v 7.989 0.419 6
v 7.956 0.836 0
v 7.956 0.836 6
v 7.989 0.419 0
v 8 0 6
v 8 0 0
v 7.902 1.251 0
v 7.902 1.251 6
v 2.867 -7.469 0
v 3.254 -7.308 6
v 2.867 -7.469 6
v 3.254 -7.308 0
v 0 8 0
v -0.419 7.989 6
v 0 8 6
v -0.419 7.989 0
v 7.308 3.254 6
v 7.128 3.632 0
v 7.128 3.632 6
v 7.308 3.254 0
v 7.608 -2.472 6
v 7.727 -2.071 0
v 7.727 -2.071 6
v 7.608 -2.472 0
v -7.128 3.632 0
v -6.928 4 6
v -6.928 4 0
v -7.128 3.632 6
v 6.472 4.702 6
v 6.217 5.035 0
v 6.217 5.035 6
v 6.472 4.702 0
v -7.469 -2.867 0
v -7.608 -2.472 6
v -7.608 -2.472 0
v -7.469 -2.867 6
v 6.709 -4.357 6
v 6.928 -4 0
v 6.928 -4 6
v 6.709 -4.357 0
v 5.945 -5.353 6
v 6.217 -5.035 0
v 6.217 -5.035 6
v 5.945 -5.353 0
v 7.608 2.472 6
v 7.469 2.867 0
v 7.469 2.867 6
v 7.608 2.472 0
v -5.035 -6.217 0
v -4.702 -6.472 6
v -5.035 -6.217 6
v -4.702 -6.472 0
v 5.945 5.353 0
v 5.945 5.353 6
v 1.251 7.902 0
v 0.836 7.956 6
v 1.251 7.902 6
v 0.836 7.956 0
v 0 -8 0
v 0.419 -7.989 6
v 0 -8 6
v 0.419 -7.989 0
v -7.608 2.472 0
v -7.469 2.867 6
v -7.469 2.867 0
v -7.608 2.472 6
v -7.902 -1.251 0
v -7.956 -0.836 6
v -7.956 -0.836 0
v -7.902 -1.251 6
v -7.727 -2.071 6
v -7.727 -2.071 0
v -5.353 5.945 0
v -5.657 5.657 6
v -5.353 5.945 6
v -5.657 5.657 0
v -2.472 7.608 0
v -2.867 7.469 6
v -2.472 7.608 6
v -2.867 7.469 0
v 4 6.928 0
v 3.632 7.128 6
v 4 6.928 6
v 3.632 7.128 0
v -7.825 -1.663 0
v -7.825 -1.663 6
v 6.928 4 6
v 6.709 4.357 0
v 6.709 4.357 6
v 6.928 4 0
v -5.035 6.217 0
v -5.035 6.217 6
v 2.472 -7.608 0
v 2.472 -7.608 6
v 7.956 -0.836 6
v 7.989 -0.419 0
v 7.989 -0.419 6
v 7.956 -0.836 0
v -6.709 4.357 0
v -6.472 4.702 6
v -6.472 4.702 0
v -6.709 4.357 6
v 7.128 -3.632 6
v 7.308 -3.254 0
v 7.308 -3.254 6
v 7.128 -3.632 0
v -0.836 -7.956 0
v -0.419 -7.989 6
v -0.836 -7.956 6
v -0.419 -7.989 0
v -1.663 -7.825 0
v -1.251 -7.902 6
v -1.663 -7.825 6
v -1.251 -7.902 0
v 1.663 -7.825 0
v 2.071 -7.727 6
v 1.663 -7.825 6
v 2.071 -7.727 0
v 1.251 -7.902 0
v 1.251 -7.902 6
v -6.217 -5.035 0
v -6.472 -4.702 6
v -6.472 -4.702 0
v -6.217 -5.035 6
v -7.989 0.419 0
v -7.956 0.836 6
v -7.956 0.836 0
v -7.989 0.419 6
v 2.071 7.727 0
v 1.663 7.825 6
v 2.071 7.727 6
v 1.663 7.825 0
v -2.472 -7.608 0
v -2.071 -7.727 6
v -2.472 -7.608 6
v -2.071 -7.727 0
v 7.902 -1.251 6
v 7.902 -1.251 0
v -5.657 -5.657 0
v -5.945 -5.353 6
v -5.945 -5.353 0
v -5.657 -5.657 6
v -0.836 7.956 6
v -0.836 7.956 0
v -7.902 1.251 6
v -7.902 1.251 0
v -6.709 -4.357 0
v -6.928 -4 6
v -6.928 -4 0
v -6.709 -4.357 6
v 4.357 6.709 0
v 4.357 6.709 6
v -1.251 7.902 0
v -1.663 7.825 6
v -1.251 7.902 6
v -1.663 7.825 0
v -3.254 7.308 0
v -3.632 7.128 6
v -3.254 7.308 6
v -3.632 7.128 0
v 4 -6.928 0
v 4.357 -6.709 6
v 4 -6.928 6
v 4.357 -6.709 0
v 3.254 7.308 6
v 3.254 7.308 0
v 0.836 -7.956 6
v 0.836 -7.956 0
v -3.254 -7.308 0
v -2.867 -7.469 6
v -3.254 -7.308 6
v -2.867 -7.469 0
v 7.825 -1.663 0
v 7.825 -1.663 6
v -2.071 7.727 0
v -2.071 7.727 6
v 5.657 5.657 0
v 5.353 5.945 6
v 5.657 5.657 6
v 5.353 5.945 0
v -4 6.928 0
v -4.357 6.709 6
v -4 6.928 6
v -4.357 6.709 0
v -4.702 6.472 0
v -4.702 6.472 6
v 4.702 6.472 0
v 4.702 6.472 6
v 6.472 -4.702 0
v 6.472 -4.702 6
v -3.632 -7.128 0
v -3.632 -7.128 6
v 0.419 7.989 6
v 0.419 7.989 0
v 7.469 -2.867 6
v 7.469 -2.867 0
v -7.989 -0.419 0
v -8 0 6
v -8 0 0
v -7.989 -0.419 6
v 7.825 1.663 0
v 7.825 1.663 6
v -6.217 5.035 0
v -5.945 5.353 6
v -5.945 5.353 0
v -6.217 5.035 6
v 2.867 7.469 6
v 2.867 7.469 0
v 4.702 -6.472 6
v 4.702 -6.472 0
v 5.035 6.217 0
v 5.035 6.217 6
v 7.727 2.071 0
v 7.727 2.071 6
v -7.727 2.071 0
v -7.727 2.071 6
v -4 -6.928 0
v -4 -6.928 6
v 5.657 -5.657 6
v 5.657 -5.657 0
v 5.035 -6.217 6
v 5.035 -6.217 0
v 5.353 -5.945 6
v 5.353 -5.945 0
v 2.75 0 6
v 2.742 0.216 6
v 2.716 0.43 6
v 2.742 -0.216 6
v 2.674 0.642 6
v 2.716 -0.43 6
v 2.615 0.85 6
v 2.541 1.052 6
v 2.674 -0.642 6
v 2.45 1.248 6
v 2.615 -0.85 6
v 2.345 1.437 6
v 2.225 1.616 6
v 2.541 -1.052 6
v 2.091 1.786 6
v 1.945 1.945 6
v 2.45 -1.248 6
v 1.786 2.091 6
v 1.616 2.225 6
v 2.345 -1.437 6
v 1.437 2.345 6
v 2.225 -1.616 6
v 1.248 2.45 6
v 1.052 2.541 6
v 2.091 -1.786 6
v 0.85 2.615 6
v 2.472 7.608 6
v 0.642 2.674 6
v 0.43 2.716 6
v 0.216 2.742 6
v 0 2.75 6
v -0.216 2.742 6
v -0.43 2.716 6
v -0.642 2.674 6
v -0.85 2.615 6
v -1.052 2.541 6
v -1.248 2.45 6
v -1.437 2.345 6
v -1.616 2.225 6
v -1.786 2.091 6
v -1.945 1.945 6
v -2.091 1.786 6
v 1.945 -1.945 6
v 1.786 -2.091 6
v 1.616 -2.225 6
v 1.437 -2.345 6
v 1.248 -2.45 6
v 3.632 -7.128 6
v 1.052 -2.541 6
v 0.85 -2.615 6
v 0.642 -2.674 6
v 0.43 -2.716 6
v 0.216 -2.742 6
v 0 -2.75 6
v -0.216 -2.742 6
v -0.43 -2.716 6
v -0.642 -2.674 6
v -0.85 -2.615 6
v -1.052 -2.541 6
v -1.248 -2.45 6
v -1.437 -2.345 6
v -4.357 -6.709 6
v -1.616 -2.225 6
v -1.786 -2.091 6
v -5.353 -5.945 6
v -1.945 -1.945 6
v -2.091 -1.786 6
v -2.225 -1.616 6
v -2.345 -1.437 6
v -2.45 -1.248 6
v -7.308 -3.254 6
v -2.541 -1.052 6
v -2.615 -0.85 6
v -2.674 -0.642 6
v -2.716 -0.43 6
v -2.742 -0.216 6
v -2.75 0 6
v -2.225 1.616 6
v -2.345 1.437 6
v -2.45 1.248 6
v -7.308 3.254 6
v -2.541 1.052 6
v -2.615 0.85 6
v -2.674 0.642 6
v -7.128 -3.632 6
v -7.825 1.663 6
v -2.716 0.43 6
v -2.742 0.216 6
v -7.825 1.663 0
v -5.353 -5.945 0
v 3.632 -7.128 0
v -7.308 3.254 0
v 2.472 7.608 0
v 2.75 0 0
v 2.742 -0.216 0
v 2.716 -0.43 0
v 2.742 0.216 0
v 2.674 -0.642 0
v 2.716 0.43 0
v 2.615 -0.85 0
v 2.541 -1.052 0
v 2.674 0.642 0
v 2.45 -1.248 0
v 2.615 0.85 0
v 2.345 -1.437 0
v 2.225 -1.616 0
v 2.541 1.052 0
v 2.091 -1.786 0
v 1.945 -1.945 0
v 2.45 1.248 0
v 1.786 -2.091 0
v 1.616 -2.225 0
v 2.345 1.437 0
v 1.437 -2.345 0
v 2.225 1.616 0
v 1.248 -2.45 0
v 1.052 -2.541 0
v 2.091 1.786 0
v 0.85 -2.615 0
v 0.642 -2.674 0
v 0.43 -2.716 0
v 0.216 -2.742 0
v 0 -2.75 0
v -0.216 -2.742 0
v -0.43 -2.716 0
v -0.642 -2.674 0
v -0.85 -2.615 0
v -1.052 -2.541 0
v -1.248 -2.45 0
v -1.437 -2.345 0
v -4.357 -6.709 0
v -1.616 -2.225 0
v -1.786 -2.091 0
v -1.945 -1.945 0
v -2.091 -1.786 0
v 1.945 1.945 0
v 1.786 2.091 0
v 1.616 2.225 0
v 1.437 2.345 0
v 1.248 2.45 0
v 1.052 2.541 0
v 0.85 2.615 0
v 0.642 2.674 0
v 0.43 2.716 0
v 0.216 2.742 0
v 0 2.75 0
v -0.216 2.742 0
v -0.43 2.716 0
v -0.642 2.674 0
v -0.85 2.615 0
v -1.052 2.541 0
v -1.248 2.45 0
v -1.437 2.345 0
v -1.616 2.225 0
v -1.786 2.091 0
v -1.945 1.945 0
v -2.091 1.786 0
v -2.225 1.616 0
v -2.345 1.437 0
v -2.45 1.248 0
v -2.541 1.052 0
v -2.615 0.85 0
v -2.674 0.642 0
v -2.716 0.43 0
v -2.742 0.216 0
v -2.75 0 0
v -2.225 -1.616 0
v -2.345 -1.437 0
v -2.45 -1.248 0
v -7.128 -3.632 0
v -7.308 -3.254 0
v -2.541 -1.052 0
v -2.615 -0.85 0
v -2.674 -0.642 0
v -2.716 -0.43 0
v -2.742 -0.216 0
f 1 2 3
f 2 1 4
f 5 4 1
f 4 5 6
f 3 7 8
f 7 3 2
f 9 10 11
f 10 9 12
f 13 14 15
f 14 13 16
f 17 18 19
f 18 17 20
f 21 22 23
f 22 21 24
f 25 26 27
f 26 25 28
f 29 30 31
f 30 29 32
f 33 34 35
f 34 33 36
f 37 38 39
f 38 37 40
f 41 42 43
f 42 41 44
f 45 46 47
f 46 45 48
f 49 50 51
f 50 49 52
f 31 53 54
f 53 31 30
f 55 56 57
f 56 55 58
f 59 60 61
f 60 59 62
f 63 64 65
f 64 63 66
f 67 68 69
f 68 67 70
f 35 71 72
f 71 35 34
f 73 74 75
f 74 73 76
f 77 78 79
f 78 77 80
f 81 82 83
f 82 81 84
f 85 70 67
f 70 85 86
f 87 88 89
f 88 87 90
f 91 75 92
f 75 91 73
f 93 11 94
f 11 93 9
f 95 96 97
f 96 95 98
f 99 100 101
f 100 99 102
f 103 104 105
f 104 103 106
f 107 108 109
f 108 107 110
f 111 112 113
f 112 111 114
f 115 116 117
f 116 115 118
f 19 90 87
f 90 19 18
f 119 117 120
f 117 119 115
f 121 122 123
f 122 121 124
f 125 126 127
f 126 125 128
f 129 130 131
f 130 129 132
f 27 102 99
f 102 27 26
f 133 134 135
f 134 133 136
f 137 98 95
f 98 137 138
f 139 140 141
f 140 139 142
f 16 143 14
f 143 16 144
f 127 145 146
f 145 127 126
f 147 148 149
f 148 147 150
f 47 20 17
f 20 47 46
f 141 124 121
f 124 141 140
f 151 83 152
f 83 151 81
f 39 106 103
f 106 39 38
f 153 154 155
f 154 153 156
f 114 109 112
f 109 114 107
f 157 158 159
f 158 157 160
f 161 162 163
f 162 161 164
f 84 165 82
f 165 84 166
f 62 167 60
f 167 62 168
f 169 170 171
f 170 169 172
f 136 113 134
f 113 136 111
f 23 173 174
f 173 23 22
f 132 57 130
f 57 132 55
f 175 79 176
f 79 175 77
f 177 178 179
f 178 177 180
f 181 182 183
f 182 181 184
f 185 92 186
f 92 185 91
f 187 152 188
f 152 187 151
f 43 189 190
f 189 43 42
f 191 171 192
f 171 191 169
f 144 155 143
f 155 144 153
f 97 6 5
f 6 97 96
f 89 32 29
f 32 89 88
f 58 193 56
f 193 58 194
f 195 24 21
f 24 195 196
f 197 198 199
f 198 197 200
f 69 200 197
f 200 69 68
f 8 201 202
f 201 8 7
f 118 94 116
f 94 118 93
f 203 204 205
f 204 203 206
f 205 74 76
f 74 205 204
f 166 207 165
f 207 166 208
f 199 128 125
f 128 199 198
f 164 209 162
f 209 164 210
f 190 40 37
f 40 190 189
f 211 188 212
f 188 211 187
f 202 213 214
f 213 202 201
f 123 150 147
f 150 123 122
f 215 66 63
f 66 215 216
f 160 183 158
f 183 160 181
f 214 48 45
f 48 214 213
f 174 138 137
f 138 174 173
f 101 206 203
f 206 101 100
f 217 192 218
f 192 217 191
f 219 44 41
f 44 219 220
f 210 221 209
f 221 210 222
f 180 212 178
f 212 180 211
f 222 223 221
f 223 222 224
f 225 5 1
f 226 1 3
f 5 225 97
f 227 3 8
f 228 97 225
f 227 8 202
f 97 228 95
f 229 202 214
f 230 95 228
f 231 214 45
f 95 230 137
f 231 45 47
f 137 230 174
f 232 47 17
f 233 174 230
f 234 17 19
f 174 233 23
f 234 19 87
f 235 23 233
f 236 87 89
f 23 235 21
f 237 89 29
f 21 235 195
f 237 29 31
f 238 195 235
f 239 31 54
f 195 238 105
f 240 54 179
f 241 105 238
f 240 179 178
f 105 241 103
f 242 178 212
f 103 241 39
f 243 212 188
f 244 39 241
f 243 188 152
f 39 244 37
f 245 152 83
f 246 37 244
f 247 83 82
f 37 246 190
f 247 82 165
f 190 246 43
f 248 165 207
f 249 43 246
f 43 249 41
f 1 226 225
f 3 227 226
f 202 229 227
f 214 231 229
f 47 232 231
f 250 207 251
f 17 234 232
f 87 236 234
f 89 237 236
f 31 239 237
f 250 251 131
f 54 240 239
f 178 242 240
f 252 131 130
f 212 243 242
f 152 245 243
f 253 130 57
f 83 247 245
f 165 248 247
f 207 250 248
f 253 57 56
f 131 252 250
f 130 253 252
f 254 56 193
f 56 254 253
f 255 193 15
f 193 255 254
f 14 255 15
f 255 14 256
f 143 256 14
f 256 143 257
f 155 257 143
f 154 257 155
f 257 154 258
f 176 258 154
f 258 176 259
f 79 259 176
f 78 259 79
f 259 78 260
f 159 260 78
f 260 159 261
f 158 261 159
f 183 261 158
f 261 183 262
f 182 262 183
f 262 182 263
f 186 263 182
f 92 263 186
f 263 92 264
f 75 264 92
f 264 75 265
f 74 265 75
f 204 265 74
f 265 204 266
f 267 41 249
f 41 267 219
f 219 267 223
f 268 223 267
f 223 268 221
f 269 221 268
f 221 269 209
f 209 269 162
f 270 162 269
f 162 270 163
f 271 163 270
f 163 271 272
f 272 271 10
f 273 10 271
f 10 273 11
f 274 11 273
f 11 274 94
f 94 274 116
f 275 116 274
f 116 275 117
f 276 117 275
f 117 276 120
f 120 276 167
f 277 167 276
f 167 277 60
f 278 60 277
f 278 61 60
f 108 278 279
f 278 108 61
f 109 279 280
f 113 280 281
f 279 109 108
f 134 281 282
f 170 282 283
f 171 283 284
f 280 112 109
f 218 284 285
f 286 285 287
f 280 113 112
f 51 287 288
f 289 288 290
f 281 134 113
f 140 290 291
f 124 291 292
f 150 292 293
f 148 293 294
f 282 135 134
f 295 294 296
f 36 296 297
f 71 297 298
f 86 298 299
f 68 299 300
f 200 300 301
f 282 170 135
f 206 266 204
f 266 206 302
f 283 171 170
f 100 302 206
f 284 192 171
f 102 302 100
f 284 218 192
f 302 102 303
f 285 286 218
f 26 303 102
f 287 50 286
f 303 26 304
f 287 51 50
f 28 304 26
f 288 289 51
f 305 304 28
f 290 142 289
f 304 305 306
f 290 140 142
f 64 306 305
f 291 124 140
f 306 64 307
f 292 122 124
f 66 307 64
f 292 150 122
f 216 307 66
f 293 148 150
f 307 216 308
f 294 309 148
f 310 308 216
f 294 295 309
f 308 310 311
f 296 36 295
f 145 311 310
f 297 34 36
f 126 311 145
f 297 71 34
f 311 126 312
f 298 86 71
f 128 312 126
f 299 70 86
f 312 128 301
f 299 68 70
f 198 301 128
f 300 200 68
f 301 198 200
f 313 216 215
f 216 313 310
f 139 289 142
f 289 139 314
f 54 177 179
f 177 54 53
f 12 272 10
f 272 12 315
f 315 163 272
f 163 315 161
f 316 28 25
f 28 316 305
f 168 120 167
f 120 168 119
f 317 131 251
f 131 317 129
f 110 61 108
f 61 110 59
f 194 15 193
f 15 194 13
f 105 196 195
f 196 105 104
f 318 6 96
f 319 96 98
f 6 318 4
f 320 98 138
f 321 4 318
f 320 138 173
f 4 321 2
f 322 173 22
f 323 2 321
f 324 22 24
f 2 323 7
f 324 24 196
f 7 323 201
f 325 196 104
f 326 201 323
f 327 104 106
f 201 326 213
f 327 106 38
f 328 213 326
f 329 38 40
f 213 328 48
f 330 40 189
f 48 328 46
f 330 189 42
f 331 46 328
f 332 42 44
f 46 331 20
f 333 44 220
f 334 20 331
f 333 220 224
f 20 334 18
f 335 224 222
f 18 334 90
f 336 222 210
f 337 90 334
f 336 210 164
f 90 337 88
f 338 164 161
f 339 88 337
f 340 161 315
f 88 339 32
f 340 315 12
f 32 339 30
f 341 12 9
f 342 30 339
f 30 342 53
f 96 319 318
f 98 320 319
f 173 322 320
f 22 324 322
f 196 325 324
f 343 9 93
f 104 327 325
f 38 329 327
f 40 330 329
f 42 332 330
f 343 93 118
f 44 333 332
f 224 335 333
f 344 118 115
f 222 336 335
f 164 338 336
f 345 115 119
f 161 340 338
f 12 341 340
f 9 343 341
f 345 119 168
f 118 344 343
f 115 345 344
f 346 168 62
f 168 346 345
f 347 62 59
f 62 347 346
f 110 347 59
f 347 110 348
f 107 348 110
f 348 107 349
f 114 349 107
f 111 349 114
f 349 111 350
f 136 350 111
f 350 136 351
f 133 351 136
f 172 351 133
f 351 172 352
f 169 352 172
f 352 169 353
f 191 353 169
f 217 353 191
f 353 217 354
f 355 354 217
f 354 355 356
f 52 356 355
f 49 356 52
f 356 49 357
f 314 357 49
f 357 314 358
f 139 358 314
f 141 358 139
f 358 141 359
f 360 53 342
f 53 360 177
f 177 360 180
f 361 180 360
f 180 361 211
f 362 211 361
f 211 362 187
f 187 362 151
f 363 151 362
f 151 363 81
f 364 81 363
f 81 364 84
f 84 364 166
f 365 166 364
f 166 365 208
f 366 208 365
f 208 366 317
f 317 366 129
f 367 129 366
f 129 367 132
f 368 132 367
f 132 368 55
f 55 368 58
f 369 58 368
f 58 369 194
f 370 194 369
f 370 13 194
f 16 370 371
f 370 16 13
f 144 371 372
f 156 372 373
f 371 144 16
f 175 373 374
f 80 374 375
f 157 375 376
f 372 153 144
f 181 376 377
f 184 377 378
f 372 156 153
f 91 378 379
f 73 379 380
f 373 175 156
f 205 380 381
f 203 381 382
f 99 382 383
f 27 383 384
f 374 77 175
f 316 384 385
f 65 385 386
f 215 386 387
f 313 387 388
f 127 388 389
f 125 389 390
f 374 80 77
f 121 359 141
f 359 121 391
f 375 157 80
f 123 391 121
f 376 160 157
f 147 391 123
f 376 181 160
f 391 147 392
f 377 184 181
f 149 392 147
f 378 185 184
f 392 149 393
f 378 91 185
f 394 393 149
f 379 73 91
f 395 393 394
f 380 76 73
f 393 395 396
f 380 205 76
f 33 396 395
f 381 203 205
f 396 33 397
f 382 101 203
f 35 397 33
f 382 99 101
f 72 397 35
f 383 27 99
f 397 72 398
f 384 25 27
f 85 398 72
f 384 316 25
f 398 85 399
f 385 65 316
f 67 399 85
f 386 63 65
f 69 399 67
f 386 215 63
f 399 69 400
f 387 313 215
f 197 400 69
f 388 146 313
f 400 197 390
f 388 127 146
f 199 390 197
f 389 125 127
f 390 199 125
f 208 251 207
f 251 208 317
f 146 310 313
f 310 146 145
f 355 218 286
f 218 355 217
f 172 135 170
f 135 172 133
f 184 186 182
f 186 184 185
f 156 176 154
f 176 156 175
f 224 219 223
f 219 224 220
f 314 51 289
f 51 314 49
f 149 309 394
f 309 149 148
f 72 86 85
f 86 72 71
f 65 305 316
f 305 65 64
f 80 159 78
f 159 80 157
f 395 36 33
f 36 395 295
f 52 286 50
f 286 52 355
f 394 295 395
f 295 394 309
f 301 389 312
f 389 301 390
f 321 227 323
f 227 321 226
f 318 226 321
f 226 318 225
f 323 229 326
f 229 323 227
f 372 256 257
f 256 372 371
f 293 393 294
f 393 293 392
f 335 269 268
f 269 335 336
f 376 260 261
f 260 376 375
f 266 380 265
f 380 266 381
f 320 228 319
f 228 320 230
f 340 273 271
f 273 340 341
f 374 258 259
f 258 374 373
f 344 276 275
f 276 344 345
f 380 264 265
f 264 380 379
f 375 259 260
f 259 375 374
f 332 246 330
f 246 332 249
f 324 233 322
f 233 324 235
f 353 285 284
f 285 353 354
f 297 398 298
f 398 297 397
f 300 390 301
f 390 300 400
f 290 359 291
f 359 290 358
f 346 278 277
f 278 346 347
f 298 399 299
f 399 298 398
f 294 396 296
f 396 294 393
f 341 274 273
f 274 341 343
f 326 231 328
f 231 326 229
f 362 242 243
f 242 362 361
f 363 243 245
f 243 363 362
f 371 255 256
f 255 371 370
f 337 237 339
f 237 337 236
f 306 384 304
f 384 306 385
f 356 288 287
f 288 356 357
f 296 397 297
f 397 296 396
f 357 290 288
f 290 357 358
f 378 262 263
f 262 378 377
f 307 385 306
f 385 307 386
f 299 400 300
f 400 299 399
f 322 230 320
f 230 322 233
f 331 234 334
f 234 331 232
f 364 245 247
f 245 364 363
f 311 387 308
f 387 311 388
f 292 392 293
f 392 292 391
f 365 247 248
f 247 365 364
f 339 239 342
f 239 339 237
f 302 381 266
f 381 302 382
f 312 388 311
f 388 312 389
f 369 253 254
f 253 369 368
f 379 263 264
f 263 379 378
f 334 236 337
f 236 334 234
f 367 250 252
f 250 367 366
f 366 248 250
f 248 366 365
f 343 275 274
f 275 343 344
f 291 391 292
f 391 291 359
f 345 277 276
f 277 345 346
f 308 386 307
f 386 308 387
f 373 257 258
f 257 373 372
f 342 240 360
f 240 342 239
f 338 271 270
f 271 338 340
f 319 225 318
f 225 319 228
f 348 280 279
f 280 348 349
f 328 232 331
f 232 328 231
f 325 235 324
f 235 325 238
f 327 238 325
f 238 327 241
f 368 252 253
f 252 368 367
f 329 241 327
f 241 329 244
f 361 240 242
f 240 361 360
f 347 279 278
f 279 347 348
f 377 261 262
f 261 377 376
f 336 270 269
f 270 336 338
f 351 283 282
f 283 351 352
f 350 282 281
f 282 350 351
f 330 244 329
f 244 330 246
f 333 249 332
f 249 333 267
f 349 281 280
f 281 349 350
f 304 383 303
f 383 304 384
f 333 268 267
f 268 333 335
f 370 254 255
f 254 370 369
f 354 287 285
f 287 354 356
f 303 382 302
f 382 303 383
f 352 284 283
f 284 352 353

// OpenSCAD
// file: src/debug_functions.scad
// ============================================================
// debug_functions.scad  (visual debugging helpers)
// ============================================================

// pct (0..100) -> t (0..path_portion)
function pct_to_t(pct, path_portion=1.0) = (pct/100) * path_portion;

function path_point_at_pct(
    pct, hub_d, hub_height, blade_length, blade_offset,
    leadW_pct, trailW_pct, leadX_pct, trailX_pct,
    path_portion=1.0
) =
    toroidal_path_spline_3d(
        pct_to_t(pct, path_portion),
        hub_d, hub_height, blade_length, blade_offset,
        leadW_pct, trailW_pct, leadX_pct, trailX_pct
    );

// ============================================================
// Debug: draw a 3D polyline (tube segments)
// ============================================================
module path_polyline(points, steps, r=0.35){
    for (i = [0:steps-1]) {
        p0 = points[i];
        p1 = points[i+1];
        v  = p1 - p0;
        L  = norm(v);

        if (L > 1e-9) {
            translate(p0)
                rotate(a = acos(clamp(v[2]/L, -1, 1)), v = [-v[1], v[0], 0])
                    cylinder(h=L, r=r, $fn=24);
        }
    }
}

module path_points_debug(points, r=0.6){
    for (p = points) translate(p) sphere(r=r, $fn=24);
}


// ============================================================
// 2D polyline -> tube (cylinders)
// ============================================================
module polyline2d_tube(pts2d, steps2d, r=0.12){
    for(i=[0:steps2d-2]){
        p0 = pts2d[i];
        p1 = pts2d[i+1];
        v  = [p1[0]-p0[0], p1[1]-p0[1], 0];
        L  = norm(v);

        if (L > 1e-9){
            translate([p0[0], p0[1], 0])
                rotate(a = acos(clamp(v[0]/L, -1, 1)), v=[0,0,1])
                    cylinder(h=L, r=r, $fn=16);
        }
    }
}

module polyline2d_tube_closed(pts2d, steps2d, r=0.12){
    polyline2d_tube(pts2d, steps2d, r=r);

    p0 = pts2d[steps2d-1];
    p1 = pts2d[0];
    v  = [p1[0]-p0[0], p1[1]-p0[1], 0];
    L  = norm(v);

    if (L > 1e-9){
        translate([p0[0], p0[1], 0])
            rotate(a = acos(clamp(v[0]/L, -1, 1)), v=[0,0,1])
                cylinder(h=L, r=r, $fn=16);
    }
}


// ============================================================
// Draw a profile outline as a "line" (tube) with chord/pivot/attack
// ============================================================
module draw_profile2D_as_line(profile, chord=10, chord_pivot_pct=0, attack_angle=0, n=90, r=0.12){
    px  = chord_pivot_pct/100;
    pts = profile_points(profile, n=n);

    // pivot + chord scale
    pts2 = [ for(p=pts) [ (p[0]-px)*chord, p[1]*chord ] ];

    // rotate in 2D (attack)
    ca = cos(attack_angle);
    sa = sin(attack_angle);
    pts3 = [ for(p=pts2) [ p[0]*ca - p[1]*sa, p[0]*sa + p[1]*ca ] ];

    steps2d = list_size(pts3);
    polyline2d_tube_closed(pts3, steps2d, r=r);
}


// ============================================================
// Debug: draw profiles along the path (perpendicular to the path)
// ============================================================
module draw_profiles_on_path_perp(
    profiles, profile_pcts, chords, chord_pivot_pcts, attack_angles,
    hub_d, hub_height, blade_length, blade_offset,
    leadW_pct, trailW_pct, leadX_pct, trailX_pct,
    path_portion=1.0,
    n=90, r=0.12
){
    n_profiles = list_size(profiles);

    for (i=[0:n_profiles-1]) {
        t = (profile_pcts[i]/100) * path_portion;

        P = toroidal_path_spline_3d(
            t, hub_d, hub_height, blade_length, blade_offset,
            leadW_pct, trailW_pct, leadX_pct, trailX_pct
        );

        T = path_tangent_at_t(
            t, hub_d, hub_height, blade_length, blade_offset,
            leadW_pct, trailW_pct, leadX_pct, trailX_pct,
            dt=1e-3
        );

        if (
            !is_undef(profile_pcts[i]) &&
            !is_undef(chords[i]) &&
            !is_undef(chord_pivot_pcts[i]) &&
            !is_undef(attack_angles[i])
        )
        translate(P)
            orient_profile_perp_with_chord_xy(T)
                trailing_upper_lower_fix(t, path_portion)
                    leading_roll_180(t, path_portion)
                        draw_profile2D_as_line(
                            profiles[i],
                            chord = chords[i],
                            chord_pivot_pct = chord_pivot_pcts[i],
                            attack_angle = attack_angles[i],
                            n = n,
                            r = r
                        );
    }
}
// file: src/profile_functions.scad
// ============================================================
// profile_functions.scad  (NACA + ellipse profiles)
// ============================================================

// --------------------
// NACA 4-digit helpers
// --------------------
function _digit(s,i) = ord(s[i]) - ord("0");

function naca4_params(code) =
    let(
        m = _digit(code,0)/100,
        p = _digit(code,1)/10,
        t = (_digit(code,2)*10 + _digit(code,3))/100
    ) [m,p,t];

// Cosine spacing in [0..1]
function _cosspace(i,n) = 0.5*(1 - cos(180*i/n));

// Thickness distribution (classic NACA)
function naca4_yt(x,t) =
    5*t*(0.2969*sqrt(x) - 0.1260*x - 0.3516*x*x + 0.2843*x*x*x - 0.1015*x*x*x*x);

// Camber line
function naca4_yc(x,m,p) =
    (m==0 || p==0) ? 0 :
    (x<p) ? (m/(p*p))*(2*p*x - x*x)
          : (m/((1-p)*(1-p)))*((1-2*p) + 2*p*x - x*x);

// Derivative of camber line
function naca4_dyc(x,m,p) =
    (m==0 || p==0) ? 0 :
    (x<p) ? (2*m/(p*p))*(p - x)
          : (2*m/((1-p)*(1-p)))*(p - x);

// NACA 4-digit closed outline points (x in [0..1])
// Note: global Y flip is kept to match your upper/lower convention.
function naca4_points(code, n=80) =
    let(
        mp = naca4_params(code),
        m=mp[0], p=mp[1], t=mp[2],

        upper = [
            for(i=[0:n])
                let(
                    x  = _cosspace(i,n),
                    yc = naca4_yc(x,m,p),
                    dy = naca4_dyc(x,m,p),
                    th = atan(dy),
                    yt = naca4_yt(x,t)
                )
                [ x - yt*sin(th), yc + yt*cos(th) ]
        ],

        // Same as iterating [n:-1:0], but without deprecated reversed ranges
        lower = [
            for(ii=[0:n])
                let(
                    i = n - ii,
                    x  = _cosspace(i,n),
                    yc = naca4_yc(x,m,p),
                    dy = naca4_dyc(x,m,p),
                    th = atan(dy),
                    yt = naca4_yt(x,t)
                )
                [ x + yt*sin(th), yc - yt*cos(th) ]
        ],

        pts = concat(upper, lower)
    )
    [ for(pnt = pts) [pnt[0], -pnt[1]] ];

// --------------------
// Ellipse profile: ["ellipse", scale]
// --------------------
function ellipse_points(scale=0.5, n=120) =
    [ for(i=[0:n-1])
        let(
            a = 360*i/n,
            x = (cos(a)+1)/2,
            y = sin(a)*scale/2
        )
        [x,y]
    ];

// Profile selector
function profile_points(profile, n=90) =
    is_string(profile) ? naca4_points(profile, n=n)
  : (is_list(profile) && profile[0]=="ellipse") ? ellipse_points(profile[1], n=n)
  : naca4_points("0012", n=n);
// file: src/path_functions.scad
// ============================================================
// path_functions.scad  (path + frames/orientation)
// ============================================================

// --------------------
// Catmull–Rom 3D spline
// --------------------
function catmull_rom3d(u, P0, P1, P2, P3) =
    let(u2=u*u, u3=u2*u)
    [0.5*(2*P1[0] + (-P0[0]+P2[0])*u + (2*P0[0]-5*P1[0]+4*P2[0]-P3[0])*u2 + (-P0[0]+3*P1[0]-3*P2[0]+P3[0])*u3),
     0.5*(2*P1[1] + (-P0[1]+P2[1])*u + (2*P0[1]-5*P1[1]+4*P2[1]-P3[1])*u2 + (-P0[1]+3*P1[1]-3*P2[1]+P3[1])*u3),
     0.5*(2*P1[2] + (-P0[2]+P2[2])*u + (2*P0[2]-5*P1[2]+4*P2[2]-P3[2])*u2 + (-P0[2]+3*P1[2]-3*P2[2]+P3[2])*u3)];


// --------------------
// Toroidal propeller path spline
// --------------------
function toroidal_path_spline_3d(
    t, hub_d, hub_height, blade_length, blade_offset,
    leadW_pct, trailW_pct, leadX_pct, trailX_pct,
    angle_A=60, angle_D=-240
) =
    let(
        leadW  = blade_length*(leadW_pct/100),
        trailW = blade_length*(trailW_pct/100),
        leadX  = blade_length*(leadX_pct/100),
        trailX = blade_length*(trailX_pct/100),

        // Effective radius based on hub diameter
        r = hub_d*cos(30)/2,

        A = [ r*cos(60),    r*sin(60),   hub_height/2 + blade_offset/2 ],
        B = [ leadX,        +leadW,      hub_height/2 ],
        M = [ blade_length, 0,           hub_height/2 ],
        C = [ trailX,       -trailW,     hub_height/2 ],
        D = [ r*cos(60),    r*sin(-60),  hub_height/2 - blade_offset/2 ],

        scale_A = norm(B-A),
        scale_D = norm(D-C),

        Ta = [ scale_A*cos(angle_A), scale_A*sin(angle_A), 0 ],
        Td = [ scale_D*cos(angle_D), scale_D*sin(angle_D), 0 ],

        A0 = B - 2*Ta,
        D3 = C + 2*Td,

        segw=1/4,
        seg = (t<segw)?0 : (t<2*segw)?1 : (t<3*segw)?2 : 3,
        u   = (seg==0)?t/segw : (seg==1)?(t-segw)/segw : (seg==2)?(t-2*segw)/segw : (t-3*segw)/segw,

        P0=(seg==0)?A0 : (seg==1)?A : (seg==2)?B : M,
        P1=(seg==0)?A  : (seg==1)?B : (seg==2)?M : C,
        P2=(seg==0)?B  : (seg==1)?M : (seg==2)?C : D,
        P3=(seg==0)?M  : (seg==1)?C : (seg==2)?D : D3
    )
    catmull_rom3d(u,P0,P1,P2,P3);

function toroidal_path_points(
    steps, hub_d, hub_height, blade_length, blade_offset,
    leadW_pct, trailW_pct, leadX_pct, trailX_pct,
    t_start=0, t_end=1
) =
[
    for(i=[0:steps])
        let(u=i/steps, tt=t_start + (t_end-t_start)*u)
        toroidal_path_spline_3d(
            tt, hub_d, hub_height, blade_length, blade_offset,
            leadW_pct, trailW_pct, leadX_pct, trailX_pct
        )
];

// Numerical tangent of the path
function path_tangent_at_t(
    t, hub_d, hub_height, blade_length, blade_offset,
    leadW_pct, trailW_pct, leadX_pct, trailX_pct,
    dt=1e-3
) =
    let(
        t0 = (t-dt < 0) ? 0 : t-dt,
        t1 = (t+dt > 1) ? 1 : t+dt,
        p0 = toroidal_path_spline_3d(t0, hub_d, hub_height, blade_length, blade_offset, leadW_pct, trailW_pct, leadX_pct, trailX_pct),
        p1 = toroidal_path_spline_3d(t1, hub_d, hub_height, blade_length, blade_offset, leadW_pct, trailW_pct, leadX_pct, trailX_pct)
    )
    vunit(p1 - p0);


// --------------------
// Frames / orientation helpers
// --------------------
// Returns [X,Y,Z] axes where:
// - Z is the tangent direction
// - X is a chord axis (perpendicular to Z)
// - Y completes a right-handed frame
function frame_axes_from_tangent(T) =
    let(
        Z = vunit(T),
        up = (abs(Z[2]) < 0.9) ? [0,0,1] : [0,1,0],
        X = vunit(cross(up, Z)),
        Y = cross(Z, X)
    )
    [X, Y, Z];

// Orients children so that local Z follows the path tangent,
// while local X/Y lie in the plane perpendicular to the tangent.
module orient_profile_perp_with_chord_xy(T){
    axes = frame_axes_from_tangent(T);
    X = axes[0]; Y = axes[1]; Z = axes[2];

    multmatrix([
        [X[0], Y[0], Z[0], 0],
        [X[1], Y[1], Z[1], 0],
        [X[2], Y[2], Z[2], 0],
        [0,    0,    0,    1]
    ]) children();
}

// Half definitions and fixes used by the older debug visualization
function is_leading_half(t, path_portion) = (t < 0.5*path_portion);

module trailing_upper_lower_fix(t, path_portion){
    if (!is_leading_half(t, path_portion)) scale([1,-1,1]) children();
    else children();
}

module leading_roll_180(t, path_portion){
    if (is_leading_half(t, path_portion)) rotate([0,0,180]) children();
    else children();
}
// file: src/helper_functions.scad
// ============================================================
// helper_functions.scad  (general helpers + loft builder)
// ============================================================

// --------------------
// Generic math / vector helpers
// --------------------
function clamp(x,a,b) = (x<a) ? a : (x>b) ? b : x;

function vlen(v)  = norm(v);
function vunit(v) = let(L=vlen(v)) (L>1e-12 ? v/L : [0,0,0]);

function vadd3(a,b) = [a[0]+b[0], a[1]+b[1], a[2]+b[2]];

// Count list length without len()
function list_size(l, i=0) = is_undef(l[i]) ? i : list_size(l, i+1);

// Recursively concat list-of-lists
function concat_many(arr, i=0) =
    is_undef(arr[i]) ? [] : concat(arr[i], concat_many(arr, i+1));

// Interpolation helpers
function lerp(a,b,u)  = a + (b-a)*u;
function lerp2(a,b,u) = [lerp(a[0],b[0],u), lerp(a[1],b[1],u)];


// ============================================================
// LOFT (polyhedron) - follows the path by interpolating between keyframes
// Caps are always disabled (no end caps)
// ============================================================

// Force a fixed number of points for any profile type
// - NACA uses 2*(nseg+1) points => choose nseg = (N/2)-1, so N must be even
function profile_points_fixedN(profile, N=80) =
    let(
        N2 = (N<4)?4:N,
        Ne = (N2%2==1)? (N2+1) : N2,
        nseg = Ne/2 - 1
    )
    is_string(profile) ? naca4_points(profile, n=nseg)
  : (is_list(profile) && profile[0]=="ellipse") ? ellipse_points(profile[1], n=Ne)
  : naca4_points("0012", n=nseg);

// Build 2D profile points with chord/pivot/attack applied (no modules)
function profile_pts2d_fixedN(profile, chord=10, chord_pivot_pct=0, attack_angle=0, N=80) =
    let(
        px  = chord_pivot_pct/100,
        pts = profile_points_fixedN(profile, N=N),
        // pivot + scale
        pts2 = [ for(p=pts) [ (p[0]-px)*chord, p[1]*chord ] ],
        // rotate in 2D (attack)
        ca = cos(attack_angle),
        sa = sin(attack_angle)
    )
    [ for(p=pts2) [ p[0]*ca - p[1]*sa, p[0]*sa + p[1]*ca ] ];

// Applies half-blade orientation corrections to a 2D airfoil profile.
//
// The toroidal blade is composed of two halves (leading and trailing)
// that face opposite directions along the path. To keep the airfoil
// consistently oriented (upper/lower surfaces and chord direction),
// different fixes are applied depending on the current path position.
//
// - For the trailing half:
//   The profile is mirrored along the Y axis to swap upper/lower surfaces.
//
// - For the leading half:
//   The profile is rotated 180° in the XY plane to reverse its chord direction.
//
// These operations ensure geometric continuity and prevent the profile
// from appearing flipped or inverted when lofted along the toroidal path.
function profile_pts2d_apply_half_fixes(t, path_portion, pts2d) =
    let(
        leading = (t < 0.5*path_portion),
        // trailing swap (flip Y)
        ptsA = (!leading) ? [ for(p=pts2d) [ p[0], -p[1] ] ] : pts2d,
        // leading roll 180 (x,y)->(-x,-y)
        ptsB = (leading) ? [ for(p=ptsA) [ -p[0], -p[1] ] ] : ptsA
    )
    ptsB;

// Convert a 2D slice (already prepared) into 3D at parameter t
function slice3d_from_pts2d(
    t, pts2d,
    hub_d, hub_height, blade_length, blade_offset,
    leadW_pct, trailW_pct, leadX_pct, trailX_pct
) =
    let(
        P = toroidal_path_spline_3d(
            t, hub_d, hub_height, blade_length, blade_offset,
            leadW_pct, trailW_pct, leadX_pct, trailX_pct
        ),
        T = path_tangent_at_t(
            t, hub_d, hub_height, blade_length, blade_offset,
            leadW_pct, trailW_pct, leadX_pct, trailX_pct,
            dt=1e-3
        ),
        axes = frame_axes_from_tangent(T),
        X = axes[0],
        Y = axes[1]
    )
    [ for(p=pts2d) P + X*p[0] + Y*p[1] ];

// Side faces between ring A and ring B (same point count N)
function loft_side_faces(N, ringA, ringB) =
    concat_many([
        for(j=[0:N-1])
            let(
                a = ringA + j,
                b = ringA + ((j+1)%N),
                c = ringB + ((j+1)%N),
                d = ringB + j
            )
            // two triangles per quad
            [ [a,b,c], [a,c,d] ]
    ]);

// Main loft module
module loft_profiles_on_path_poly_follow(
    profiles, profile_pcts, chords, chord_pivot_pcts, attack_angles,
    hub_d, hub_height, blade_length, blade_offset,
    leadW_pct, trailW_pct, leadX_pct, trailX_pct,
    path_portion=1.0,
    N=80,
    steps_per_span=12
){
    n_profiles = list_size(profiles);
    Np = (N%2==1) ? (N+1) : N;

    key_t = [ for(i=[0:n_profiles-1]) (profile_pcts[i]/100) * path_portion ];

    // Precompute 2D keyframes (already fixed by leading/trailing half rules)
    key_pts2d = [
        for(i=[0:n_profiles-1])
            let(ti = key_t[i])
            profile_pts2d_apply_half_fixes(
                ti, path_portion,
                profile_pts2d_fixedN(
                    profiles[i],
                    chord=chords[i],
                    chord_pivot_pct=chord_pivot_pcts[i],
                    attack_angle=attack_angles[i],
                    N=Np
                )
            )
    ];

    // Build interpolated slices between keyframes
    slices = concat_many([
        for(i=[0:n_profiles-2])
            concat_many([
                for(s=[0:steps_per_span-1])
                    let(
                        u = s/steps_per_span,
                        t = lerp(key_t[i], key_t[i+1], u),
                        pts2d_blend = [
                            for(k=[0:Np-1])
                                lerp2(key_pts2d[i][k], key_pts2d[i+1][k], u)
                        ]
                    )
                    [ slice3d_from_pts2d(
                        t, pts2d_blend,
                        hub_d, hub_height, blade_length, blade_offset,
                        leadW_pct, trailW_pct, leadX_pct, trailX_pct
                    ) ]
            ])
    ]);

    // Add last slice
    slices2 = concat(slices, [
        slice3d_from_pts2d(
            key_t[n_profiles-1], key_pts2d[n_profiles-1],
            hub_d, hub_height, blade_length, blade_offset,
            leadW_pct, trailW_pct, leadX_pct, trailX_pct
        )
    ]);

    pts = concat_many(slices2);
    n_slices = list_size(slices2);

    faces_side = concat_many([
        for(i=[0:n_slices-2])
            loft_side_faces(Np, i*Np, (i+1)*Np)
    ]);

    polyhedron(points=pts, faces=faces_side, convexity=10);
}
// file: src/toroidal_propeller.scad
// ============================================================
// toroidal_propeller.scad
// ============================================================

eps = 1/128;
$fn = 100;

include <helper_functions.scad>;
include <path_functions.scad>;
include <profile_functions.scad>;
include <debug_functions.scad>;

module toroidal_propeller(
    blades=2,

    // Hub
    hub_height=6,
    hub_d=16,
    hub_screw_d=5.5,
    hub_notch_height=0,
    hub_notch_d=0,

    // Blade / Path
    blade_offset=2,
    blade_length=68,

    leading_blade_width=18,
    trailing_blade_width=18,
    leading_blade_xoffset=50,
    trailing_blade_xoffset=60,

    // Profiles (keyframes)
    profiles=["8412",["ellipse",0.5],"2412"],
    profile_pcts=[0,50,100],
    chords=[8,2,6],
    chord_pivot_pcts=[0,0,0],
    attack_angles=[15,0,-10],

    path_portion=1.0,
    rotation="CCW",          // "CCW" | "CW"

    // Loft resolution
    loft_profile_points=80,  // N (even) points per section
    loft_steps_per_span=16   // slices between keyframes
){
    // ---------------------------
    // For debug only
    // ---------------------------
    // pts = toroidal_path_points(
    //     120,
    //     hub_d, hub_height,
    //     blade_length, blade_offset,
    //     leading_blade_width,
    //     trailing_blade_width,
    //     leading_blade_xoffset,
    //     trailing_blade_xoffset
    // );

    // // create line-path
    // path_polyline(pts, 120, r=0.4);
    // // create point-path
    // // path_points_debug(pts, r=0.8);

    // // draw the profiles
    // draw_profiles_on_path_perp(
    //     profiles,
    //     profile_pcts,
    //     chords,
    //     chord_pivot_pcts,
    //     attack_angles,

    //     hub_d,
    //     hub_height,
    //     blade_length,
    //     blade_offset,

    //     leading_blade_width,
    //     trailing_blade_width,
    //     leading_blade_xoffset,
    //     trailing_blade_xoffset,

    //     path_portion = 1.0,
    //     n = 90,      // resolution of profile
    //     r = 0.15     // line thickness
    // );

    // ---------------------------
    // Blades
    // ---------------------------
    module one_blade(){
        loft_profiles_on_path_poly_follow(
            profiles, profile_pcts, chords, chord_pivot_pcts, attack_angles,
            hub_d, hub_height, blade_length, blade_offset,
            leading_blade_width, trailing_blade_width,
            leading_blade_xoffset, trailing_blade_xoffset,
            path_portion=path_portion,
            N=loft_profile_points,
            steps_per_span=loft_steps_per_span
        );
    }

    module all_blades(){
        for (b=[0:blades-1])
            rotate([0,0,360*b/blades])
                one_blade();
    }

    // CW = mirror in YZ plane => invert X
    if (rotation == "CW")
        mirror([1,0,0]) all_blades();
    else
        all_blades();

    // ---------------------------
    // Hub (cylindrical)
    // ---------------------------
    difference() {
        cylinder(d=hub_d, h=hub_height, $fn=120);

        translate([0,0,-eps])
            cylinder(d=hub_screw_d, h=hub_height+2*eps, $fn=80);

        if (hub_notch_height>0 && hub_notch_d>0)
            translate([0,0,-eps])
                cylinder(d=hub_notch_d, h=hub_notch_height+eps, $fn=80);
    }
}

// quick test
toroidal_propeller();
// main file
use <src/toroidal_propeller.scad>
$fn = 100;  // global tessellation (higher = smoother preview/export)

toroidal_propeller(
    // -------------------------
    // Blade count + rotation
    // -------------------------
    blades = 2,                                                // number of blades (copied/rotated around Z)
    rotation = "CCW",                                           // "CCW" (default) or "CW" (mirrored in YZ plane)

    // -------------------------
    // Hub geometry
    // -------------------------
    hub_height = 6,                                            // hub height
    hub_d = 16,                                                // hub outer diameter
    hub_screw_d = 5.5,                                         // center screw hole diameter
    hub_notch_height = 0,                                      // optional notch height (0 = disabled)
    hub_notch_d = 0,                                           // optional notch diameter (0 = disabled)

    // -------------------------
    // Path / blade geometry
    // -------------------------
    blade_length = 40,                                         // blade span/length used by the toroidal path
    blade_offset = 2,                                          // Z offset between leading/trailing halves
    leading_blade_width = 25,                             // leading half width (percent of blade_length)
    trailing_blade_width = 20,                            // trailing half width (percent of blade_length)
    leading_blade_xoffset = 50,                           // leading half X offset (percent of blade_length)
    trailing_blade_xoffset = 80,                          // trailing half X offset (percent of blade_length)

    // -------------------------
    // Airfoil profiles (keyframes along the path)
    // -------------------------
    profiles = ["2412","2412",["ellipse", 0.5],"2412","8412"], // NACA 4-digit or ["ellipse", scale]
    profile_pcts = [0,35,50,87,100],                           // keyframe positions along the path (0..100)
    chords = [8,3,2.5,3,4],                                    // chord length at each keyframe (same order as profiles)
    chord_pivot_pcts = [50,25,100,50,65],                      // pivot along chord: 0=LE, 50=mid, 100=TE
    attack_angles = [15,40,-90,0,10],                          // attack angle (deg) at each keyframe

    // -------------------------
    // Render only part of the path
    // -------------------------
    path_portion = 1.0                                         // 1.0 = full path, 0.5 = half path, etc.
);
